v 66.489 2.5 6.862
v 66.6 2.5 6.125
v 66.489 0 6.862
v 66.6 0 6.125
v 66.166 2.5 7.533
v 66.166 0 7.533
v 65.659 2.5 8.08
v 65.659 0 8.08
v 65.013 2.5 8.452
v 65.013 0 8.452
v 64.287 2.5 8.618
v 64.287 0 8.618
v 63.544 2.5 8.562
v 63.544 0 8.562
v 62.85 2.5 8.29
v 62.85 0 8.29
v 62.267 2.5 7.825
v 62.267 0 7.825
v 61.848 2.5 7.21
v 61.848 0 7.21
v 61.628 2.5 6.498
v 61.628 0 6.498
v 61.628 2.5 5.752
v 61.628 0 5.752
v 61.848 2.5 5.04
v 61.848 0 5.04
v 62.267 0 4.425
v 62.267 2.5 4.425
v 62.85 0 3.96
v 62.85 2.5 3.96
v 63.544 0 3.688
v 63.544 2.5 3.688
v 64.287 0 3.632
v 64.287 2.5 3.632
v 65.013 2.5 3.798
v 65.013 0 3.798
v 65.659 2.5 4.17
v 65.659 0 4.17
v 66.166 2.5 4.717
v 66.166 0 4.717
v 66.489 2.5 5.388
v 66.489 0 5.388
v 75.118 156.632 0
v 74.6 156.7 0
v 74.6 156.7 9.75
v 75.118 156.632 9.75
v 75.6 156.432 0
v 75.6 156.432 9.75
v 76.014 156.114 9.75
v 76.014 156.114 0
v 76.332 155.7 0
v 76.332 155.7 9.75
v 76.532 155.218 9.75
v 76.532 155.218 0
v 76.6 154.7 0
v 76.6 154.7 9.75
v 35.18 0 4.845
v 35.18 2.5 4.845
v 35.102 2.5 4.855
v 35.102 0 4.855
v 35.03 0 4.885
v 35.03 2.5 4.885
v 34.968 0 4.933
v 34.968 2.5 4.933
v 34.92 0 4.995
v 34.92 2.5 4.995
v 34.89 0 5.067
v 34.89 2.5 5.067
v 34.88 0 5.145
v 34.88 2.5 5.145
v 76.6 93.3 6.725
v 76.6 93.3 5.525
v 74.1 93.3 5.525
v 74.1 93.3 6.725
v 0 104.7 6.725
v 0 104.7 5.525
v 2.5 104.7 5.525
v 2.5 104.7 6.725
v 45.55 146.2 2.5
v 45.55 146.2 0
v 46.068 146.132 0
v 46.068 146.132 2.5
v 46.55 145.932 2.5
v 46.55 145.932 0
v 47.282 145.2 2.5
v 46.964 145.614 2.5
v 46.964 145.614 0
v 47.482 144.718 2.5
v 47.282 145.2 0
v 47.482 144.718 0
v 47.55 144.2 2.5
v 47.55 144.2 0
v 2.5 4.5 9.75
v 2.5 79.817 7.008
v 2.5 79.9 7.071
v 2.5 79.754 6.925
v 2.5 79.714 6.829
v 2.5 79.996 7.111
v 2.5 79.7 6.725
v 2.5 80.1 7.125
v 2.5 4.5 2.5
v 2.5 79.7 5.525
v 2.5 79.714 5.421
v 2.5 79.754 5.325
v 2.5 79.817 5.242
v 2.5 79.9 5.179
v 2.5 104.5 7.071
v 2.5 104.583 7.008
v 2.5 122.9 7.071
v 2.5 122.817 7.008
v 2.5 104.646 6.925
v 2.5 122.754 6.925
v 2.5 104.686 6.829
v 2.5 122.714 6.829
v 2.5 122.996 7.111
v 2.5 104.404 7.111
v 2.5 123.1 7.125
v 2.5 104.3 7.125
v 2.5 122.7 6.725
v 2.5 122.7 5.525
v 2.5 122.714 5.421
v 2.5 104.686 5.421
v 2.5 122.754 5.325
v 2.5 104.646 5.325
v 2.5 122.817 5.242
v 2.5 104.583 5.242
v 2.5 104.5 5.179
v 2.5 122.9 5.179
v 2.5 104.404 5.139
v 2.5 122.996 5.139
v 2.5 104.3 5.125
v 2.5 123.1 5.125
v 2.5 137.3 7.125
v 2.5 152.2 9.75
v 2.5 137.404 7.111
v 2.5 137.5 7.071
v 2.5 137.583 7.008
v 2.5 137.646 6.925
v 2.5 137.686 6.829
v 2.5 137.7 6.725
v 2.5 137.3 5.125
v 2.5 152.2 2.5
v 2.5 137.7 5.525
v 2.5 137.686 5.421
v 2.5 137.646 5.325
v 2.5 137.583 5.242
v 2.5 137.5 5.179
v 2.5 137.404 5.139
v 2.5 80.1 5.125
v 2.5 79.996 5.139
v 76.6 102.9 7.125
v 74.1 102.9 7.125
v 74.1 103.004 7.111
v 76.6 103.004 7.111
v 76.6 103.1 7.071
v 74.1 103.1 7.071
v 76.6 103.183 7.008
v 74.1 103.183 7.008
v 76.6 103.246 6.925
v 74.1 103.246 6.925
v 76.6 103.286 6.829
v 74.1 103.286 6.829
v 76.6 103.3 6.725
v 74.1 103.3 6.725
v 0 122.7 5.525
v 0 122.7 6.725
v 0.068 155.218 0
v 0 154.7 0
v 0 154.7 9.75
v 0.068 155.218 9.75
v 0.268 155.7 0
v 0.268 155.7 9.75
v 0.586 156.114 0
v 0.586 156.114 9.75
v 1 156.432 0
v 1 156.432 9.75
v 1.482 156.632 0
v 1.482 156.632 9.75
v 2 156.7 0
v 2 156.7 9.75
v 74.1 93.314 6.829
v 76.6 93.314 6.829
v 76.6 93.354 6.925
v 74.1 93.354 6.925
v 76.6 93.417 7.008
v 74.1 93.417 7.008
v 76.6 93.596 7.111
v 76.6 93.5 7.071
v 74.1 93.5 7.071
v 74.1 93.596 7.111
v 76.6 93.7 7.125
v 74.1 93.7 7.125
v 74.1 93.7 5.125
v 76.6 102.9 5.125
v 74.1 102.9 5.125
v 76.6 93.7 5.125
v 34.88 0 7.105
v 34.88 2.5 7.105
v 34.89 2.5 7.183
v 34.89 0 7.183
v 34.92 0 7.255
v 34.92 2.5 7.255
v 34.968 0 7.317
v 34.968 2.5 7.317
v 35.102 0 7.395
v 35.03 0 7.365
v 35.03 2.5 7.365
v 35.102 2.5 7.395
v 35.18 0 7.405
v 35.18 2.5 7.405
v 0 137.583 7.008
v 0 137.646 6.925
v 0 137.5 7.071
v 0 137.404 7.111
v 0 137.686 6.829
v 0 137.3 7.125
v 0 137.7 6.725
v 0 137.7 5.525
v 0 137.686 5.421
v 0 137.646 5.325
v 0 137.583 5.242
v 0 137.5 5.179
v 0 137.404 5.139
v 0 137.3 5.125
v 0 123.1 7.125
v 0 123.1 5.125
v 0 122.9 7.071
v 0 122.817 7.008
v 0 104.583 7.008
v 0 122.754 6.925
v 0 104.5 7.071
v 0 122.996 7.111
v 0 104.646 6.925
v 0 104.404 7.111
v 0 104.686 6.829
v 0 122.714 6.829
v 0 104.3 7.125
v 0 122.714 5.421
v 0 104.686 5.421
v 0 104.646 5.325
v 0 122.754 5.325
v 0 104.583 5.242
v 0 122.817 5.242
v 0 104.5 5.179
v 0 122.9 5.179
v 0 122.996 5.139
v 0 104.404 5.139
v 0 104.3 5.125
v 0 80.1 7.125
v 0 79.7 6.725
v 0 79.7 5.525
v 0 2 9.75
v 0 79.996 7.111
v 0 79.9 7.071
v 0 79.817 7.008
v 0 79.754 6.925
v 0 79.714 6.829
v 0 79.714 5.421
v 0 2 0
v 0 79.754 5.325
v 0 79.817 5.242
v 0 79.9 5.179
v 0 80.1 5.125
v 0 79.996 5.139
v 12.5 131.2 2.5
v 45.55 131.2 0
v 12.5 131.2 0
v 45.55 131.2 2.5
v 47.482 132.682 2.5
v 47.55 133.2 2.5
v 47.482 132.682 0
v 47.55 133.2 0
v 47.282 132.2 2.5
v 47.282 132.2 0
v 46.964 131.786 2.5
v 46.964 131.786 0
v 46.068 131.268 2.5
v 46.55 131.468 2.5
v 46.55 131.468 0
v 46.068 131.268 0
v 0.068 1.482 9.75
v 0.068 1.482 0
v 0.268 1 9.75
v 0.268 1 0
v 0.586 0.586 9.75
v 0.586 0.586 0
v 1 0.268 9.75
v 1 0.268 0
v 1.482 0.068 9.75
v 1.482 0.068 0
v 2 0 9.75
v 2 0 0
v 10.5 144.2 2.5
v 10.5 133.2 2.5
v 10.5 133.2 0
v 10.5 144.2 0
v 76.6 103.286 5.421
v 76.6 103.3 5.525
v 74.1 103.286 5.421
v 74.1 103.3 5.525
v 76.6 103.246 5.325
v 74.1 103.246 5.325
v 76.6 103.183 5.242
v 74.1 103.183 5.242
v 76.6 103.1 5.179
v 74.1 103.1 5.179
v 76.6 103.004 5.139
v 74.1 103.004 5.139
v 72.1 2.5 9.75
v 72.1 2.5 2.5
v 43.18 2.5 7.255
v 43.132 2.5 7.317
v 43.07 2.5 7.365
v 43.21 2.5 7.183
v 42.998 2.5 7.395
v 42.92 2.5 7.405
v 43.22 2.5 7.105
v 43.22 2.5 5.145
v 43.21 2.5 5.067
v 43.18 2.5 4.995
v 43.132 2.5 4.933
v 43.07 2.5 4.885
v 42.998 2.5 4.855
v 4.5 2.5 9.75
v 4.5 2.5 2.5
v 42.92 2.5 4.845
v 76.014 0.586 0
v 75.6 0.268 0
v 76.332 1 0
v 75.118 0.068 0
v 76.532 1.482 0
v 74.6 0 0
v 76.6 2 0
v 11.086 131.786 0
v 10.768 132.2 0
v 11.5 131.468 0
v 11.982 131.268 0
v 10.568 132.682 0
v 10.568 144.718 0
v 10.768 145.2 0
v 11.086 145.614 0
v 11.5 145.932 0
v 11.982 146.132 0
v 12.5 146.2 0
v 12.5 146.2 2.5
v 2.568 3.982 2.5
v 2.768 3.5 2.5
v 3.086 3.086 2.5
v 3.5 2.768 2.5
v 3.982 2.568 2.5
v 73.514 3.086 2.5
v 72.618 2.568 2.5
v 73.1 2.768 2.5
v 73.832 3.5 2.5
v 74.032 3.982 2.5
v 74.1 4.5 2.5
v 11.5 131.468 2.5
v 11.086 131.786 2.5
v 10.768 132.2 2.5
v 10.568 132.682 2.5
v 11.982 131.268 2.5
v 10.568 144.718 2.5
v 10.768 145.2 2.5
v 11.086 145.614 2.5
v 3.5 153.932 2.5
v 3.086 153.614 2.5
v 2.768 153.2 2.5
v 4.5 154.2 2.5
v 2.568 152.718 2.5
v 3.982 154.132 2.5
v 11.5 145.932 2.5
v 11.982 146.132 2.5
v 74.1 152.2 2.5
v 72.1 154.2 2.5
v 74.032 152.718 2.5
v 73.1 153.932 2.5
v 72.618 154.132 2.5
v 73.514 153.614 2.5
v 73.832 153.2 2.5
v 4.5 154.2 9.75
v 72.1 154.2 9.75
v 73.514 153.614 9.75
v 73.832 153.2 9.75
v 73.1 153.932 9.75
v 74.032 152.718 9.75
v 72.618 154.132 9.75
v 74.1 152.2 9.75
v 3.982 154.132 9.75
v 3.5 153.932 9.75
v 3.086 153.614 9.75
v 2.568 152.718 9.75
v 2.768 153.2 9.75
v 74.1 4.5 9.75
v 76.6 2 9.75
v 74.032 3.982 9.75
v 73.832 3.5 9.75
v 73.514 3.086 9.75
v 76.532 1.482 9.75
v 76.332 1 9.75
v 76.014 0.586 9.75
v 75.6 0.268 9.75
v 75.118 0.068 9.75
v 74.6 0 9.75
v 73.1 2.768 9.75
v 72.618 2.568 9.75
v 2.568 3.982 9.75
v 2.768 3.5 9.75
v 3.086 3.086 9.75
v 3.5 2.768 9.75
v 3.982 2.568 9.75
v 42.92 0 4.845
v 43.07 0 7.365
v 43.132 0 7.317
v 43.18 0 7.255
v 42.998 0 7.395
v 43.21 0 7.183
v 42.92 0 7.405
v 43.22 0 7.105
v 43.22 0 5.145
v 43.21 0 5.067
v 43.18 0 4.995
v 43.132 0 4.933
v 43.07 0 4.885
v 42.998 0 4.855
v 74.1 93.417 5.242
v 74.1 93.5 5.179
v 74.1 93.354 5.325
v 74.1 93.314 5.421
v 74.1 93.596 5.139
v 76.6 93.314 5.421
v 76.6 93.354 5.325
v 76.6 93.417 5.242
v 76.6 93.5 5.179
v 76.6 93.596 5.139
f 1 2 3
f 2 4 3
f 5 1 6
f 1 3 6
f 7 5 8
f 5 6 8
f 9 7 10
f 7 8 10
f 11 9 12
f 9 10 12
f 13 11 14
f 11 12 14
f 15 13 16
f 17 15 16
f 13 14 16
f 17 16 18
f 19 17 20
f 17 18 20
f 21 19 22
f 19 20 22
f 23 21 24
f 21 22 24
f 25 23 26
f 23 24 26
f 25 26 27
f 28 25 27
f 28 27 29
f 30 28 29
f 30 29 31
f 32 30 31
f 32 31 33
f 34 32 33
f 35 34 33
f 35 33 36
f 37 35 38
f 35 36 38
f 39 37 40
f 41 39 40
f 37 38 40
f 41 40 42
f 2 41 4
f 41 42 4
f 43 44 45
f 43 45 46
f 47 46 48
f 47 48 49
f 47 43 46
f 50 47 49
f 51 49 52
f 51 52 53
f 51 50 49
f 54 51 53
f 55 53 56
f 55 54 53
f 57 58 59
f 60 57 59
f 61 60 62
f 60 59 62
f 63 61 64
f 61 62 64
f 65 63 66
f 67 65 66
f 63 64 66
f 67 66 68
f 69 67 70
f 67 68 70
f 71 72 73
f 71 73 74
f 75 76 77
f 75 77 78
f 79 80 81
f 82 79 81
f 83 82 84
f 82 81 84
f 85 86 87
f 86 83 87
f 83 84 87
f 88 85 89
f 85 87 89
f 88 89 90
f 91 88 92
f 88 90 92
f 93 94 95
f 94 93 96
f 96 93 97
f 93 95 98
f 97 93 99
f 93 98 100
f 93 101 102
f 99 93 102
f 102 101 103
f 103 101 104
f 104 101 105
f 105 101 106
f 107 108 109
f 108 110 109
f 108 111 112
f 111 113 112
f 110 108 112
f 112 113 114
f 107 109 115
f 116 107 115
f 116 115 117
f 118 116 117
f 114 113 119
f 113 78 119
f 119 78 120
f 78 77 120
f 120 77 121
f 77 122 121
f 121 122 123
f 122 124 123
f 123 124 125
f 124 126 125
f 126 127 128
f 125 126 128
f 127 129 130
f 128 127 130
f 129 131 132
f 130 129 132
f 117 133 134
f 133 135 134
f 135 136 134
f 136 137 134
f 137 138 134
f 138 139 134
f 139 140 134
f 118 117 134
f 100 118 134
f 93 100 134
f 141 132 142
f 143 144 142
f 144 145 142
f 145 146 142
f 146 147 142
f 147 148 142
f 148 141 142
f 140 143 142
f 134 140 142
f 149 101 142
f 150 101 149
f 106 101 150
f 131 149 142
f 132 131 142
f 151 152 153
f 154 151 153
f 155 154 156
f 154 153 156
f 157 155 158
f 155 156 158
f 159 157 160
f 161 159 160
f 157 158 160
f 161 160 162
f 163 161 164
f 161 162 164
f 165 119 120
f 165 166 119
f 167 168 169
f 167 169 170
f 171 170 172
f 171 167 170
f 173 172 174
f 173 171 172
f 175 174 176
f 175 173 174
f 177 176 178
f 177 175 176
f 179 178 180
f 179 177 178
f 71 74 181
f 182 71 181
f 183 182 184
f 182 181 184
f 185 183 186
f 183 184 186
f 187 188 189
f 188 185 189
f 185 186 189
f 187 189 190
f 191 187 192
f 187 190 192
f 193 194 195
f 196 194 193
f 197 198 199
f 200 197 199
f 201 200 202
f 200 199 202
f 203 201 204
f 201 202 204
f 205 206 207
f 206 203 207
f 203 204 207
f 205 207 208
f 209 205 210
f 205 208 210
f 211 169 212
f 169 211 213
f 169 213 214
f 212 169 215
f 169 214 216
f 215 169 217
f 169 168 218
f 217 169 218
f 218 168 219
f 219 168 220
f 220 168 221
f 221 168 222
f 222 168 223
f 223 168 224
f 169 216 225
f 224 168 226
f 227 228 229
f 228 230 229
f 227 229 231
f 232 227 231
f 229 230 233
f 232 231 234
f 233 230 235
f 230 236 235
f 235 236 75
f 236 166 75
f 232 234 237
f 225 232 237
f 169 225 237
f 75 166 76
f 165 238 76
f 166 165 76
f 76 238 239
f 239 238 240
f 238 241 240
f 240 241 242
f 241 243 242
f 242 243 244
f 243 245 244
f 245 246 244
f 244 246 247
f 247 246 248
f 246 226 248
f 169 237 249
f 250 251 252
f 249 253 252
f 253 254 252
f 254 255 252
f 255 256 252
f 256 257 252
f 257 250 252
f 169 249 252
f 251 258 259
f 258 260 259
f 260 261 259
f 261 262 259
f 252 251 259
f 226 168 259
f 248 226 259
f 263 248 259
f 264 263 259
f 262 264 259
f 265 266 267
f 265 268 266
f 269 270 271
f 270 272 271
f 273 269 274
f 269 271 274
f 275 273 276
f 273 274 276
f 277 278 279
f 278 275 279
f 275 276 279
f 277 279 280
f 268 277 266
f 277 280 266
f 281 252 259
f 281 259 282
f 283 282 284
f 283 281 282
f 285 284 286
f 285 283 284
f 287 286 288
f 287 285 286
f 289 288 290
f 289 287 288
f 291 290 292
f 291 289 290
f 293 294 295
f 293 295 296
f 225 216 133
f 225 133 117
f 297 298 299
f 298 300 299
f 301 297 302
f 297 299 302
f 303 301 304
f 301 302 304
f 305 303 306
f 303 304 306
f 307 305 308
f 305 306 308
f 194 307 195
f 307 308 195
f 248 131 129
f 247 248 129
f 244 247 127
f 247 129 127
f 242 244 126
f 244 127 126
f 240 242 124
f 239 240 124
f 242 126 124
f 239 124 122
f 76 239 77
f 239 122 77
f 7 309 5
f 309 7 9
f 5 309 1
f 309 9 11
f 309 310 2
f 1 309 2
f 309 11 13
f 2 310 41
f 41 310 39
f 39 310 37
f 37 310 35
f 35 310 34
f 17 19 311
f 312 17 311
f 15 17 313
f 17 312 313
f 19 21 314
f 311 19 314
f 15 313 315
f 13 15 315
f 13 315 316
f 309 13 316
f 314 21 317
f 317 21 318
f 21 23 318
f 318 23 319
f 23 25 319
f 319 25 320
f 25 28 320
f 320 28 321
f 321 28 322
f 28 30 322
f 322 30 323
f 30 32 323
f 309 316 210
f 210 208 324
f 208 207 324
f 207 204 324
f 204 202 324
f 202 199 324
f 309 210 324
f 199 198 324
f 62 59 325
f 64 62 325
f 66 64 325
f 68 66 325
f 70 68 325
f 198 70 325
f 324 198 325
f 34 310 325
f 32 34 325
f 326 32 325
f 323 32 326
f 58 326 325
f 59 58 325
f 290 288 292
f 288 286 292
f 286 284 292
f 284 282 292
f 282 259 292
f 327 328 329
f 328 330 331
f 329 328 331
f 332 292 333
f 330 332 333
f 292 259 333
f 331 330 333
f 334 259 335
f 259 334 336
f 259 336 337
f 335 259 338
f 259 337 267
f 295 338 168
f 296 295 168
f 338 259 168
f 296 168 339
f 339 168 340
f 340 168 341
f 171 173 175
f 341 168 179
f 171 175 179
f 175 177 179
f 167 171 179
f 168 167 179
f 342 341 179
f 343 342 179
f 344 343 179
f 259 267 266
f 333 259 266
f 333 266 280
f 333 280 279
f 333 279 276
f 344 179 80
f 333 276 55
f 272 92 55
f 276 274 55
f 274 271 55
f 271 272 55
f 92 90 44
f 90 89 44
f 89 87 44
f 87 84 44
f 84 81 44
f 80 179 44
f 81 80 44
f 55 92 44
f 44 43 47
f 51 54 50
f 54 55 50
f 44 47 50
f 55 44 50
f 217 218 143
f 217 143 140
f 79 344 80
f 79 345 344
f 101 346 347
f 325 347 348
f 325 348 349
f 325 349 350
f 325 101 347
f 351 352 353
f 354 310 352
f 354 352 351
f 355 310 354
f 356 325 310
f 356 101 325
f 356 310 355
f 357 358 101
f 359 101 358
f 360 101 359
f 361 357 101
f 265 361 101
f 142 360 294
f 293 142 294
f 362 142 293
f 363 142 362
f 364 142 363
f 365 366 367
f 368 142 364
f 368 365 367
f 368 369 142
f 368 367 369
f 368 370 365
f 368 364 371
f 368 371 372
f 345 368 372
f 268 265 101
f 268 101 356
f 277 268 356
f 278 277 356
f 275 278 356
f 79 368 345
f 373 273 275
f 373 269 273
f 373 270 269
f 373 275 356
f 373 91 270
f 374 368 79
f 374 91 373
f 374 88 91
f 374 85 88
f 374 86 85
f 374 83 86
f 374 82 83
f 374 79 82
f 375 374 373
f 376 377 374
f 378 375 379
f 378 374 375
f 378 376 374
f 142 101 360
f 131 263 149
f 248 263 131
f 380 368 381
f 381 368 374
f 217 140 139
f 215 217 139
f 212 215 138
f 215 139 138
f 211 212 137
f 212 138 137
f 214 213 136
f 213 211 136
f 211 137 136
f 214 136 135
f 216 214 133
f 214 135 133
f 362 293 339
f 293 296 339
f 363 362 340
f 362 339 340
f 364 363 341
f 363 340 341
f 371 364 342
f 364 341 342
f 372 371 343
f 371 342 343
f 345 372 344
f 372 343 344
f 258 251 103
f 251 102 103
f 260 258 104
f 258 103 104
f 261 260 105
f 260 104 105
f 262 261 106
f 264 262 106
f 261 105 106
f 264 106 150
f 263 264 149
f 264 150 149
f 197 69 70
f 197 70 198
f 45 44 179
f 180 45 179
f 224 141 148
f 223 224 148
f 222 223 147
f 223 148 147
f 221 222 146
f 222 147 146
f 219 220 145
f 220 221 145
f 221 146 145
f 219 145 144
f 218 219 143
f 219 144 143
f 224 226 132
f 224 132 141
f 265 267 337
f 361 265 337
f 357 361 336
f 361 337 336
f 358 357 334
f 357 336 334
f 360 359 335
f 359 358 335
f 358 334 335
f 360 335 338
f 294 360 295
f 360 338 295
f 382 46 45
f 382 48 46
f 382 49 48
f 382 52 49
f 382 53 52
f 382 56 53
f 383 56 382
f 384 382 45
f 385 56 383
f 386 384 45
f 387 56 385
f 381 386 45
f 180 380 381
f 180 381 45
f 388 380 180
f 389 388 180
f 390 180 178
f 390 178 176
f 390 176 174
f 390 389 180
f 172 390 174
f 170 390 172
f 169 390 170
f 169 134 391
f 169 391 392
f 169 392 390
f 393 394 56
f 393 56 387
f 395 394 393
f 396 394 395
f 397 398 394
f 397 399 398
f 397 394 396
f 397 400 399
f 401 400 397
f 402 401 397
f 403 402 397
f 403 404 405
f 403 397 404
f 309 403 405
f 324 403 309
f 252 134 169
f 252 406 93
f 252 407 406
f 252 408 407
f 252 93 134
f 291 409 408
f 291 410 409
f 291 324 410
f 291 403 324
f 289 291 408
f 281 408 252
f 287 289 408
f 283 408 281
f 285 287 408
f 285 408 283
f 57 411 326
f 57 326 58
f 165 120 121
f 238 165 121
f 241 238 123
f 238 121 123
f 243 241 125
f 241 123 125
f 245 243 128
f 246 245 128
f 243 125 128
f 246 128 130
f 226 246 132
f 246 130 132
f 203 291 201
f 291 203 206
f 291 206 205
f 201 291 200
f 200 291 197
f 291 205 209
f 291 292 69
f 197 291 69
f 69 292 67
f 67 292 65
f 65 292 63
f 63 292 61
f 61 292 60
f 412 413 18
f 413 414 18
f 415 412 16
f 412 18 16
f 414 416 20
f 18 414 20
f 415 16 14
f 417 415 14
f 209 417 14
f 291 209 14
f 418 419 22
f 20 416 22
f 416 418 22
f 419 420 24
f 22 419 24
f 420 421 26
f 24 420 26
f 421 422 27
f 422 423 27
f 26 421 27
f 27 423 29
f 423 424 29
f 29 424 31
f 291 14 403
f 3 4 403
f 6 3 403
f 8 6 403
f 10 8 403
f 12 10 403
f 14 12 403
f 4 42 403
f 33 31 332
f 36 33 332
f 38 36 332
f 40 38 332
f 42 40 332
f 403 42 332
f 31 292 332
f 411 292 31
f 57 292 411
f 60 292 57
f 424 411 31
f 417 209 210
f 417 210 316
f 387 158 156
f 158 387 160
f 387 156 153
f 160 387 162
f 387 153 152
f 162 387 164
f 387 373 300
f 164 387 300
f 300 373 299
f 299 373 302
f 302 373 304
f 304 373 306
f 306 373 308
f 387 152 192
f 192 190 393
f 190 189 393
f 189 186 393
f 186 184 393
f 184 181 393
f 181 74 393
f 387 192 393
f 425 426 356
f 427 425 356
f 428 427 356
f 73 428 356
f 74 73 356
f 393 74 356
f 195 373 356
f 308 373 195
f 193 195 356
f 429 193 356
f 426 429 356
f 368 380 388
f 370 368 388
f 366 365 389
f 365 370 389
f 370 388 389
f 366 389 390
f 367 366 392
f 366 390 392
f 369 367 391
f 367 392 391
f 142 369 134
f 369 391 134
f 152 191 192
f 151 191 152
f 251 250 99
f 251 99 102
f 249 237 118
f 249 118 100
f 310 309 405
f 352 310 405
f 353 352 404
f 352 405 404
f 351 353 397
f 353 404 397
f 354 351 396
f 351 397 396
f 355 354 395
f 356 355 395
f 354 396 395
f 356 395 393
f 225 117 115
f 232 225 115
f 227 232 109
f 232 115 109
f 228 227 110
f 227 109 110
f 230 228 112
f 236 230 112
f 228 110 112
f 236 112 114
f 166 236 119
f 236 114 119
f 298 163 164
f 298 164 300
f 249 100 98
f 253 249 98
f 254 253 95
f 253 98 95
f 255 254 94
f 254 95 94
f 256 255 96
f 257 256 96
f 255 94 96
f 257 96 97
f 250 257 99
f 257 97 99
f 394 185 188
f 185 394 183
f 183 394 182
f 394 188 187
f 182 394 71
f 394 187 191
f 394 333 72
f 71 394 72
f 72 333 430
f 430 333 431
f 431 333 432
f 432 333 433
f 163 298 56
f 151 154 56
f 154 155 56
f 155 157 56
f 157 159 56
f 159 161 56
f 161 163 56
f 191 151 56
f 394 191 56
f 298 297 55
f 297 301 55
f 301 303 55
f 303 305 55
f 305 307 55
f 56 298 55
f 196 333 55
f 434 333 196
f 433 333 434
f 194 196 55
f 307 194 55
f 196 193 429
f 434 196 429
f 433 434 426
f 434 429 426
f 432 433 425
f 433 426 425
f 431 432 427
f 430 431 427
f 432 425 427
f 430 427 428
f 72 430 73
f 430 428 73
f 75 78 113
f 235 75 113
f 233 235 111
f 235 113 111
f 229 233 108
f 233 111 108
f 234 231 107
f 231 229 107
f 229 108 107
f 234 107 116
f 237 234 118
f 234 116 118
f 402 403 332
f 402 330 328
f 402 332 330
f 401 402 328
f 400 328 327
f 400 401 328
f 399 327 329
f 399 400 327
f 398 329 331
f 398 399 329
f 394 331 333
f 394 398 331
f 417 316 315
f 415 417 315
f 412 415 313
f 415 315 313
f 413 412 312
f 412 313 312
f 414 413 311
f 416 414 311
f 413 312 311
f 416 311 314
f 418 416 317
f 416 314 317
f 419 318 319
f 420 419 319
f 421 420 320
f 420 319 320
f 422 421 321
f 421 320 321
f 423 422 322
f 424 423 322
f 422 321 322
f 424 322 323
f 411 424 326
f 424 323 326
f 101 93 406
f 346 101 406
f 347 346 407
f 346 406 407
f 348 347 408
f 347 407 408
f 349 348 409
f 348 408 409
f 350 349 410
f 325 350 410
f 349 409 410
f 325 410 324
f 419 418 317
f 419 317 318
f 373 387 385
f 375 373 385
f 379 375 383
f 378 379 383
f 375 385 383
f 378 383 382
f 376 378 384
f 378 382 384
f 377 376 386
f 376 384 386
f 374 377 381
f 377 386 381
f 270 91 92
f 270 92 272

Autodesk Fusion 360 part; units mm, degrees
sketch "Sketch1" plane through (0, 0, 0) normal (0, 0, 1) x (1, 0, 0)
  line L0 (0, 0) -> (76.6, 0)
  line L1 (76.6, 0) -> (76.6, 156.7)
  line L2 (76.6, 156.7) -> (0, 156.7)
  line L3 (0, 156.7) -> (0, 0)
  dimension "d5" = 76.6
  dimension "d6" = 156.7
extrude "Extrude1" add sketch "Sketch1" along normal blind 2.5
sketch "Sketch2" plane through (0, 0, 2.5) normal (0, 0, 1) x (-1, 0, 0)
  line L0 (0, -156.7) -> (0, 0)
  line L1 (0, 0) -> (-76.6, 0)
  line L2 (-76.6, 0) -> (-76.6, -156.7)
  line L3 (-76.6, -156.7) -> (0, -156.7)
  line L4 (-2.5, -154.2) -> (-74.1, -154.2)
  line L5 (-74.1, -154.2) -> (-74.1, -2.5)
  line L6 (-74.1, -2.5) -> (-2.5, -2.5)
  line L7 (-2.5, -2.5) -> (-2.5, -154.2)
  dimension "d13" = 2.5
  dimension "d14" = 2.5
  dimension "d15" = 2.5
  dimension "d16" = 2.5
extrude "Extrude2" add sketch "Sketch2" along normal blind 7.25
fillet "Fillet1" radius 2 4 edges at (74.1, 154.2, 6.125) (2.5, 154.2, 6.125) (74.1, 2.5, 6.125) (2.5, 2.5, 6.125)
fillet "Fillet2" radius 2 4 edges at (0, 0, 4.875) (0, 156.7, 4.875) (76.6, 0, 4.875) (76.6, 156.7, 4.875)
sketch "Sketch3" plane through (0, 0, 2.5) normal (0, 0, 1) x (-1, 0, 0)
  arc A0 (-2.5, -4.5) -> (-4.5, -2.5) centre (-4.5, -4.5) ccw
  line L0 (-4.5, -2.5) -> (-72.1, -2.5)
  arc A1 (-72.1, -2.5) -> (-74.1, -4.5) centre (-72.1, -4.5) ccw
  line L1 (-74.1, -4.5) -> (-74.1, -152.2)
  arc A2 (-74.1, -152.2) -> (-72.1, -154.2) centre (-72.1, -152.2) ccw
  line L2 (-72.1, -154.2) -> (-4.5, -154.2)
  arc A3 (-4.5, -154.2) -> (-2.5, -152.2) centre (-4.5, -152.2) ccw
  line L3 (-2.5, -152.2) -> (-2.5, -4.5)
  line L4 (-10.5, -146.2) -> (-47.55, -146.2)
  line L5 (-47.55, -146.2) -> (-47.55, -131.2)
  line L6 (-47.55, -131.2) -> (-10.5, -131.2)
  line L7 (-10.5, -131.2) -> (-10.5, -146.2)
  dimension "d28" = 37.05
  dimension "d29" = 15
  dimension "d30" = 37.05
  dimension "d31" = 8
  dimension "d32" = 8
extrude "Extrude3" cut sketch "Sketch3" against normal blind 10 contours L4 L5 L6 L7
fillet "Fillet3" radius 2 4 edges at (10.5, 146.2, 1.25) (47.55, 146.2, 1.25) (47.55, 131.2, 1.25) (10.5, 131.2, 1.25)
sketch "Sketch4" plane through (0, 0, 0) normal (0, -1, 0) x (1, 0, 0)
  line L0 (74.6, 0) -> (74.6, 9.75)
  line L1 (74.6, 9.75) -> (2, 9.75)
  line L2 (2, 9.75) -> (2, 0)
  line L3 (2, 0) -> (74.6, 0)
  line L4 (34.88, 7.405) -> (43.22, 7.405)
  line L5 (43.22, 7.405) -> (43.22, 4.845)
  line L6 (43.22, 4.845) -> (34.88, 4.845)
  line L7 (34.88, 4.845) -> (34.88, 7.405)
  dimension "d39" = 8.34
  dimension "d40" = 2.56
  dimension "d41" = 32.88
  dimension "d42" = 2.345
extrude "Extrude4" cut sketch "Sketch4" against normal blind 7 contours L4 L5 L6 L7
fillet "Fillet4" radius 0.3 4 edges at (43.22, 1.25, 7.405) (34.88, 1.25, 7.405) (34.88, 1.25, 4.845) (43.22, 1.25, 4.845)
sketch "Sketch5" plane through (0, 0, 0) normal (0, -1, 0) x (1, 0, 0)
  line L0 (43.22, 7.105) -> (43.22, 5.145)
  arc A0 (42.92, 4.845) -> (43.22, 5.145) centre (42.92, 5.145) ccw
  line L1 (42.92, 4.845) -> (35.18, 4.845)
  arc A1 (34.88, 5.145) -> (35.18, 4.845) centre (35.18, 5.145) ccw
  line L2 (34.88, 5.145) -> (34.88, 7.105)
  arc A2 (35.18, 7.405) -> (34.88, 7.105) centre (35.18, 7.105) ccw
  line L3 (35.18, 7.405) -> (42.92, 7.405)
  arc A3 (43.22, 7.105) -> (42.92, 7.405) centre (42.92, 7.105) ccw
  line L4 (74.6, 0) -> (74.6, 9.75)
  line L5 (74.6, 9.75) -> (2, 9.75)
  line L6 (2, 9.75) -> (2, 0)
  line L7 (2, 0) -> (74.6, 0)
  circle A4 centre (64.1, 6.125) radius 2.5
  dimension "d50" = 5
  dimension "d51" = 10.5
  dimension "d52" = 3.625
extrude "Extrude5" cut sketch "Sketch5" against normal blind 6 contours A4
sketch "Sketch6" plane through (76.6, 0, 0) normal (1, 0, 0) x (0, 1, 0)
  line L0 (154.7, 0) -> (154.7, 9.75)
  line L1 (154.7, 9.75) -> (2, 9.75)
  line L2 (2, 9.75) -> (2, 0)
  line L3 (2, 0) -> (154.7, 0)
  line L4 (93.3, 7.125) -> (103.3, 7.125)
  line L5 (103.3, 7.125) -> (103.3, 5.125)
  line L6 (103.3, 5.125) -> (93.3, 5.125)
  line L7 (93.3, 5.125) -> (93.3, 7.125)
  dimension "d58" = 10
  dimension "d59" = 2
  dimension "d60" = 51.4
  dimension "d61" = 2.625
extrude "Extrude6" cut sketch "Sketch6" against normal blind 4 contours L4 L5 L6 L7
sketch "Sketch7" plane through (0, 0, 0) normal (-1, 0, 0) x (0, -1, 0)
  line L0 (-154.7, 9.75) -> (-154.7, 0)
  line L1 (-154.7, 0) -> (-2, 0)
  line L2 (-2, 0) -> (-2, 9.75)
  line L3 (-2, 9.75) -> (-154.7, 9.75)
  line L4 (-137.7, 7.125) -> (-122.7, 7.125)
  line L5 (-122.7, 7.125) -> (-122.7, 5.125)
  line L6 (-122.7, 5.125) -> (-137.7, 5.125)
  line L7 (-137.7, 5.125) -> (-137.7, 7.125)
  dimension "d70" = 15
  dimension "d71" = 2
  dimension "d72" = 17
  dimension "d73" = 2.625
extrude "Extrude7" cut sketch "Sketch7" against normal blind 7 contours L4 L5 L6 L7
sketch "Sketch8" plane through (0, 0, 0) normal (-1, 0, 0) x (0, -1, 0)
  line L0 (-122.7, 7.125) -> (-122.7, 5.125)
  line L1 (-122.7, 5.125) -> (-137.7, 5.125)
  line L2 (-137.7, 5.125) -> (-137.7, 7.125)
  line L3 (-137.7, 7.125) -> (-122.7, 7.125)
  line L4 (-154.7, 9.75) -> (-154.7, 0)
  line L5 (-154.7, 0) -> (-2, 0)
  line L6 (-2, 0) -> (-2, 9.75)
  line L7 (-2, 9.75) -> (-154.7, 9.75)
  line L8 (-104.7, 7.125) -> (-79.7, 7.125)
  line L9 (-79.7, 7.125) -> (-79.7, 5.125)
  line L10 (-79.7, 5.125) -> (-104.7, 5.125)
  line L11 (-104.7, 5.125) -> (-104.7, 7.125)
  dimension "d76" = 25
  dimension "d77" = 2
  dimension "d78" = 18
  dimension "d79" = 2.625
extrude "Extrude8" cut sketch "Sketch8" against normal blind 5 contours L8 L9 L10 L11
fillet "Fillet5" radius 0.4 4 edges at (1.25, 122.7, 7.125) (1.25, 122.7, 5.125) (1.25, 137.7, 5.125) (1.25, 137.7, 7.125)
fillet "Fillet6" radius 0.4 4 edges at (1.25, 104.7, 7.125) (1.25, 104.7, 5.125) (1.25, 79.7, 7.125) (1.25, 79.7, 5.125)
fillet "Fillet7" radius 0.4 4 edges at (75.35, 93.3, 5.125) (75.35, 103.3, 7.125) (75.35, 103.3, 5.125) (75.35, 93.3, 7.125)
equation "phone_height = 154.2 mm"
equation "phone_width = 74.1 mm"
equation "phone_depth = 7.25 mm"
equation "case_depth = 2.5 mm"
equation "d5 = phone_width + case_depth"
equation "d6 = phone_height + case_depth"
equation "d11 = case_depth"
equation "d13 = case_depth"
equation "d14 = case_depth"
equation "d15 = case_depth"
equation "d16 = case_depth"
equation "d17 = phone_depth"
equation "fillet_amount = 2 mm"
equation "d21 = fillet_amount"
equation "d23 = fillet_amount"
equation "camera_margin_top = 8 mm"
equation "camera_margin_left = 8 mm"
equation "camera_height = 15 mm"
equation "camera_width = phone_width * 0.5"
equation "d28 = camera_width"
equation "d29 = camera_height"
equation "d31 = camera_margin_left"
equation "d32 = camera_margin_top"
equation "d36 = fillet_amount"
equation "usbc_width = 8.34 mm"
equation "usbc_height = 2.56 mm"
equation "d39 = usbc_width"
equation "d40 = usbc_height"
equation "d41 = ( phone_width / 2 ) - ( usbc_width / 2 )"
equation "d42 = ( phone_depth / 2 ) - ( usbc_height / 2 )"
equation "d46 = usb_c_fillet"
equation "usb_c_fillet = 0.3 mm"
equation "aux_diameter = 5 mm"
equation "aux_margin_right = 8 mm"
equation "d50 = aux_diameter"
equation "d51 = aux_margin_right + ( aux_diameter / 2 )"
equation "d52 = phone_depth / 2"
equation "sidebutton_width = 10 mm"
equation "sidebutton_height = 2 mm"
equation "sidebutton_margin_right = phone_height / 3"
equation "d58 = sidebutton_width"
equation "d59 = sidebutton_height"
equation "d60 = sidebutton_margin_right"
equation "d61 = ( phone_depth / 2 ) - ( sidebutton_height / 2 )"
equation "volume_width = 25 mm"
equation "volume_height = 2 mm"
equation "sliderbutton_width = 15 mm"
equation "sliderbutton_height = 2 mm"
equation "sliderbutton_margin_left = 17 mm"
equation "volumebutton_distance_to_sliderbutton = 18 mm"
equation "d70 = sliderbutton_width"
equation "d71 = sliderbutton_height"
equation "d72 = sliderbutton_margin_left"
equation "d73 = ( phone_depth / 2 ) - ( sliderbutton_height / 2 )"
equation "d76 = volume_width"
equation "d77 = volume_height"
equation "d78 = volumebutton_distance_to_sliderbutton"
equation "d79 = ( phone_depth / 2 ) - ( volume_height / 2 )"
equation "button_fillet = 0.4 mm"
equation "d84 = button_fillet"
equation "d86 = button_fillet"
equation "d88 = button_fillet"
